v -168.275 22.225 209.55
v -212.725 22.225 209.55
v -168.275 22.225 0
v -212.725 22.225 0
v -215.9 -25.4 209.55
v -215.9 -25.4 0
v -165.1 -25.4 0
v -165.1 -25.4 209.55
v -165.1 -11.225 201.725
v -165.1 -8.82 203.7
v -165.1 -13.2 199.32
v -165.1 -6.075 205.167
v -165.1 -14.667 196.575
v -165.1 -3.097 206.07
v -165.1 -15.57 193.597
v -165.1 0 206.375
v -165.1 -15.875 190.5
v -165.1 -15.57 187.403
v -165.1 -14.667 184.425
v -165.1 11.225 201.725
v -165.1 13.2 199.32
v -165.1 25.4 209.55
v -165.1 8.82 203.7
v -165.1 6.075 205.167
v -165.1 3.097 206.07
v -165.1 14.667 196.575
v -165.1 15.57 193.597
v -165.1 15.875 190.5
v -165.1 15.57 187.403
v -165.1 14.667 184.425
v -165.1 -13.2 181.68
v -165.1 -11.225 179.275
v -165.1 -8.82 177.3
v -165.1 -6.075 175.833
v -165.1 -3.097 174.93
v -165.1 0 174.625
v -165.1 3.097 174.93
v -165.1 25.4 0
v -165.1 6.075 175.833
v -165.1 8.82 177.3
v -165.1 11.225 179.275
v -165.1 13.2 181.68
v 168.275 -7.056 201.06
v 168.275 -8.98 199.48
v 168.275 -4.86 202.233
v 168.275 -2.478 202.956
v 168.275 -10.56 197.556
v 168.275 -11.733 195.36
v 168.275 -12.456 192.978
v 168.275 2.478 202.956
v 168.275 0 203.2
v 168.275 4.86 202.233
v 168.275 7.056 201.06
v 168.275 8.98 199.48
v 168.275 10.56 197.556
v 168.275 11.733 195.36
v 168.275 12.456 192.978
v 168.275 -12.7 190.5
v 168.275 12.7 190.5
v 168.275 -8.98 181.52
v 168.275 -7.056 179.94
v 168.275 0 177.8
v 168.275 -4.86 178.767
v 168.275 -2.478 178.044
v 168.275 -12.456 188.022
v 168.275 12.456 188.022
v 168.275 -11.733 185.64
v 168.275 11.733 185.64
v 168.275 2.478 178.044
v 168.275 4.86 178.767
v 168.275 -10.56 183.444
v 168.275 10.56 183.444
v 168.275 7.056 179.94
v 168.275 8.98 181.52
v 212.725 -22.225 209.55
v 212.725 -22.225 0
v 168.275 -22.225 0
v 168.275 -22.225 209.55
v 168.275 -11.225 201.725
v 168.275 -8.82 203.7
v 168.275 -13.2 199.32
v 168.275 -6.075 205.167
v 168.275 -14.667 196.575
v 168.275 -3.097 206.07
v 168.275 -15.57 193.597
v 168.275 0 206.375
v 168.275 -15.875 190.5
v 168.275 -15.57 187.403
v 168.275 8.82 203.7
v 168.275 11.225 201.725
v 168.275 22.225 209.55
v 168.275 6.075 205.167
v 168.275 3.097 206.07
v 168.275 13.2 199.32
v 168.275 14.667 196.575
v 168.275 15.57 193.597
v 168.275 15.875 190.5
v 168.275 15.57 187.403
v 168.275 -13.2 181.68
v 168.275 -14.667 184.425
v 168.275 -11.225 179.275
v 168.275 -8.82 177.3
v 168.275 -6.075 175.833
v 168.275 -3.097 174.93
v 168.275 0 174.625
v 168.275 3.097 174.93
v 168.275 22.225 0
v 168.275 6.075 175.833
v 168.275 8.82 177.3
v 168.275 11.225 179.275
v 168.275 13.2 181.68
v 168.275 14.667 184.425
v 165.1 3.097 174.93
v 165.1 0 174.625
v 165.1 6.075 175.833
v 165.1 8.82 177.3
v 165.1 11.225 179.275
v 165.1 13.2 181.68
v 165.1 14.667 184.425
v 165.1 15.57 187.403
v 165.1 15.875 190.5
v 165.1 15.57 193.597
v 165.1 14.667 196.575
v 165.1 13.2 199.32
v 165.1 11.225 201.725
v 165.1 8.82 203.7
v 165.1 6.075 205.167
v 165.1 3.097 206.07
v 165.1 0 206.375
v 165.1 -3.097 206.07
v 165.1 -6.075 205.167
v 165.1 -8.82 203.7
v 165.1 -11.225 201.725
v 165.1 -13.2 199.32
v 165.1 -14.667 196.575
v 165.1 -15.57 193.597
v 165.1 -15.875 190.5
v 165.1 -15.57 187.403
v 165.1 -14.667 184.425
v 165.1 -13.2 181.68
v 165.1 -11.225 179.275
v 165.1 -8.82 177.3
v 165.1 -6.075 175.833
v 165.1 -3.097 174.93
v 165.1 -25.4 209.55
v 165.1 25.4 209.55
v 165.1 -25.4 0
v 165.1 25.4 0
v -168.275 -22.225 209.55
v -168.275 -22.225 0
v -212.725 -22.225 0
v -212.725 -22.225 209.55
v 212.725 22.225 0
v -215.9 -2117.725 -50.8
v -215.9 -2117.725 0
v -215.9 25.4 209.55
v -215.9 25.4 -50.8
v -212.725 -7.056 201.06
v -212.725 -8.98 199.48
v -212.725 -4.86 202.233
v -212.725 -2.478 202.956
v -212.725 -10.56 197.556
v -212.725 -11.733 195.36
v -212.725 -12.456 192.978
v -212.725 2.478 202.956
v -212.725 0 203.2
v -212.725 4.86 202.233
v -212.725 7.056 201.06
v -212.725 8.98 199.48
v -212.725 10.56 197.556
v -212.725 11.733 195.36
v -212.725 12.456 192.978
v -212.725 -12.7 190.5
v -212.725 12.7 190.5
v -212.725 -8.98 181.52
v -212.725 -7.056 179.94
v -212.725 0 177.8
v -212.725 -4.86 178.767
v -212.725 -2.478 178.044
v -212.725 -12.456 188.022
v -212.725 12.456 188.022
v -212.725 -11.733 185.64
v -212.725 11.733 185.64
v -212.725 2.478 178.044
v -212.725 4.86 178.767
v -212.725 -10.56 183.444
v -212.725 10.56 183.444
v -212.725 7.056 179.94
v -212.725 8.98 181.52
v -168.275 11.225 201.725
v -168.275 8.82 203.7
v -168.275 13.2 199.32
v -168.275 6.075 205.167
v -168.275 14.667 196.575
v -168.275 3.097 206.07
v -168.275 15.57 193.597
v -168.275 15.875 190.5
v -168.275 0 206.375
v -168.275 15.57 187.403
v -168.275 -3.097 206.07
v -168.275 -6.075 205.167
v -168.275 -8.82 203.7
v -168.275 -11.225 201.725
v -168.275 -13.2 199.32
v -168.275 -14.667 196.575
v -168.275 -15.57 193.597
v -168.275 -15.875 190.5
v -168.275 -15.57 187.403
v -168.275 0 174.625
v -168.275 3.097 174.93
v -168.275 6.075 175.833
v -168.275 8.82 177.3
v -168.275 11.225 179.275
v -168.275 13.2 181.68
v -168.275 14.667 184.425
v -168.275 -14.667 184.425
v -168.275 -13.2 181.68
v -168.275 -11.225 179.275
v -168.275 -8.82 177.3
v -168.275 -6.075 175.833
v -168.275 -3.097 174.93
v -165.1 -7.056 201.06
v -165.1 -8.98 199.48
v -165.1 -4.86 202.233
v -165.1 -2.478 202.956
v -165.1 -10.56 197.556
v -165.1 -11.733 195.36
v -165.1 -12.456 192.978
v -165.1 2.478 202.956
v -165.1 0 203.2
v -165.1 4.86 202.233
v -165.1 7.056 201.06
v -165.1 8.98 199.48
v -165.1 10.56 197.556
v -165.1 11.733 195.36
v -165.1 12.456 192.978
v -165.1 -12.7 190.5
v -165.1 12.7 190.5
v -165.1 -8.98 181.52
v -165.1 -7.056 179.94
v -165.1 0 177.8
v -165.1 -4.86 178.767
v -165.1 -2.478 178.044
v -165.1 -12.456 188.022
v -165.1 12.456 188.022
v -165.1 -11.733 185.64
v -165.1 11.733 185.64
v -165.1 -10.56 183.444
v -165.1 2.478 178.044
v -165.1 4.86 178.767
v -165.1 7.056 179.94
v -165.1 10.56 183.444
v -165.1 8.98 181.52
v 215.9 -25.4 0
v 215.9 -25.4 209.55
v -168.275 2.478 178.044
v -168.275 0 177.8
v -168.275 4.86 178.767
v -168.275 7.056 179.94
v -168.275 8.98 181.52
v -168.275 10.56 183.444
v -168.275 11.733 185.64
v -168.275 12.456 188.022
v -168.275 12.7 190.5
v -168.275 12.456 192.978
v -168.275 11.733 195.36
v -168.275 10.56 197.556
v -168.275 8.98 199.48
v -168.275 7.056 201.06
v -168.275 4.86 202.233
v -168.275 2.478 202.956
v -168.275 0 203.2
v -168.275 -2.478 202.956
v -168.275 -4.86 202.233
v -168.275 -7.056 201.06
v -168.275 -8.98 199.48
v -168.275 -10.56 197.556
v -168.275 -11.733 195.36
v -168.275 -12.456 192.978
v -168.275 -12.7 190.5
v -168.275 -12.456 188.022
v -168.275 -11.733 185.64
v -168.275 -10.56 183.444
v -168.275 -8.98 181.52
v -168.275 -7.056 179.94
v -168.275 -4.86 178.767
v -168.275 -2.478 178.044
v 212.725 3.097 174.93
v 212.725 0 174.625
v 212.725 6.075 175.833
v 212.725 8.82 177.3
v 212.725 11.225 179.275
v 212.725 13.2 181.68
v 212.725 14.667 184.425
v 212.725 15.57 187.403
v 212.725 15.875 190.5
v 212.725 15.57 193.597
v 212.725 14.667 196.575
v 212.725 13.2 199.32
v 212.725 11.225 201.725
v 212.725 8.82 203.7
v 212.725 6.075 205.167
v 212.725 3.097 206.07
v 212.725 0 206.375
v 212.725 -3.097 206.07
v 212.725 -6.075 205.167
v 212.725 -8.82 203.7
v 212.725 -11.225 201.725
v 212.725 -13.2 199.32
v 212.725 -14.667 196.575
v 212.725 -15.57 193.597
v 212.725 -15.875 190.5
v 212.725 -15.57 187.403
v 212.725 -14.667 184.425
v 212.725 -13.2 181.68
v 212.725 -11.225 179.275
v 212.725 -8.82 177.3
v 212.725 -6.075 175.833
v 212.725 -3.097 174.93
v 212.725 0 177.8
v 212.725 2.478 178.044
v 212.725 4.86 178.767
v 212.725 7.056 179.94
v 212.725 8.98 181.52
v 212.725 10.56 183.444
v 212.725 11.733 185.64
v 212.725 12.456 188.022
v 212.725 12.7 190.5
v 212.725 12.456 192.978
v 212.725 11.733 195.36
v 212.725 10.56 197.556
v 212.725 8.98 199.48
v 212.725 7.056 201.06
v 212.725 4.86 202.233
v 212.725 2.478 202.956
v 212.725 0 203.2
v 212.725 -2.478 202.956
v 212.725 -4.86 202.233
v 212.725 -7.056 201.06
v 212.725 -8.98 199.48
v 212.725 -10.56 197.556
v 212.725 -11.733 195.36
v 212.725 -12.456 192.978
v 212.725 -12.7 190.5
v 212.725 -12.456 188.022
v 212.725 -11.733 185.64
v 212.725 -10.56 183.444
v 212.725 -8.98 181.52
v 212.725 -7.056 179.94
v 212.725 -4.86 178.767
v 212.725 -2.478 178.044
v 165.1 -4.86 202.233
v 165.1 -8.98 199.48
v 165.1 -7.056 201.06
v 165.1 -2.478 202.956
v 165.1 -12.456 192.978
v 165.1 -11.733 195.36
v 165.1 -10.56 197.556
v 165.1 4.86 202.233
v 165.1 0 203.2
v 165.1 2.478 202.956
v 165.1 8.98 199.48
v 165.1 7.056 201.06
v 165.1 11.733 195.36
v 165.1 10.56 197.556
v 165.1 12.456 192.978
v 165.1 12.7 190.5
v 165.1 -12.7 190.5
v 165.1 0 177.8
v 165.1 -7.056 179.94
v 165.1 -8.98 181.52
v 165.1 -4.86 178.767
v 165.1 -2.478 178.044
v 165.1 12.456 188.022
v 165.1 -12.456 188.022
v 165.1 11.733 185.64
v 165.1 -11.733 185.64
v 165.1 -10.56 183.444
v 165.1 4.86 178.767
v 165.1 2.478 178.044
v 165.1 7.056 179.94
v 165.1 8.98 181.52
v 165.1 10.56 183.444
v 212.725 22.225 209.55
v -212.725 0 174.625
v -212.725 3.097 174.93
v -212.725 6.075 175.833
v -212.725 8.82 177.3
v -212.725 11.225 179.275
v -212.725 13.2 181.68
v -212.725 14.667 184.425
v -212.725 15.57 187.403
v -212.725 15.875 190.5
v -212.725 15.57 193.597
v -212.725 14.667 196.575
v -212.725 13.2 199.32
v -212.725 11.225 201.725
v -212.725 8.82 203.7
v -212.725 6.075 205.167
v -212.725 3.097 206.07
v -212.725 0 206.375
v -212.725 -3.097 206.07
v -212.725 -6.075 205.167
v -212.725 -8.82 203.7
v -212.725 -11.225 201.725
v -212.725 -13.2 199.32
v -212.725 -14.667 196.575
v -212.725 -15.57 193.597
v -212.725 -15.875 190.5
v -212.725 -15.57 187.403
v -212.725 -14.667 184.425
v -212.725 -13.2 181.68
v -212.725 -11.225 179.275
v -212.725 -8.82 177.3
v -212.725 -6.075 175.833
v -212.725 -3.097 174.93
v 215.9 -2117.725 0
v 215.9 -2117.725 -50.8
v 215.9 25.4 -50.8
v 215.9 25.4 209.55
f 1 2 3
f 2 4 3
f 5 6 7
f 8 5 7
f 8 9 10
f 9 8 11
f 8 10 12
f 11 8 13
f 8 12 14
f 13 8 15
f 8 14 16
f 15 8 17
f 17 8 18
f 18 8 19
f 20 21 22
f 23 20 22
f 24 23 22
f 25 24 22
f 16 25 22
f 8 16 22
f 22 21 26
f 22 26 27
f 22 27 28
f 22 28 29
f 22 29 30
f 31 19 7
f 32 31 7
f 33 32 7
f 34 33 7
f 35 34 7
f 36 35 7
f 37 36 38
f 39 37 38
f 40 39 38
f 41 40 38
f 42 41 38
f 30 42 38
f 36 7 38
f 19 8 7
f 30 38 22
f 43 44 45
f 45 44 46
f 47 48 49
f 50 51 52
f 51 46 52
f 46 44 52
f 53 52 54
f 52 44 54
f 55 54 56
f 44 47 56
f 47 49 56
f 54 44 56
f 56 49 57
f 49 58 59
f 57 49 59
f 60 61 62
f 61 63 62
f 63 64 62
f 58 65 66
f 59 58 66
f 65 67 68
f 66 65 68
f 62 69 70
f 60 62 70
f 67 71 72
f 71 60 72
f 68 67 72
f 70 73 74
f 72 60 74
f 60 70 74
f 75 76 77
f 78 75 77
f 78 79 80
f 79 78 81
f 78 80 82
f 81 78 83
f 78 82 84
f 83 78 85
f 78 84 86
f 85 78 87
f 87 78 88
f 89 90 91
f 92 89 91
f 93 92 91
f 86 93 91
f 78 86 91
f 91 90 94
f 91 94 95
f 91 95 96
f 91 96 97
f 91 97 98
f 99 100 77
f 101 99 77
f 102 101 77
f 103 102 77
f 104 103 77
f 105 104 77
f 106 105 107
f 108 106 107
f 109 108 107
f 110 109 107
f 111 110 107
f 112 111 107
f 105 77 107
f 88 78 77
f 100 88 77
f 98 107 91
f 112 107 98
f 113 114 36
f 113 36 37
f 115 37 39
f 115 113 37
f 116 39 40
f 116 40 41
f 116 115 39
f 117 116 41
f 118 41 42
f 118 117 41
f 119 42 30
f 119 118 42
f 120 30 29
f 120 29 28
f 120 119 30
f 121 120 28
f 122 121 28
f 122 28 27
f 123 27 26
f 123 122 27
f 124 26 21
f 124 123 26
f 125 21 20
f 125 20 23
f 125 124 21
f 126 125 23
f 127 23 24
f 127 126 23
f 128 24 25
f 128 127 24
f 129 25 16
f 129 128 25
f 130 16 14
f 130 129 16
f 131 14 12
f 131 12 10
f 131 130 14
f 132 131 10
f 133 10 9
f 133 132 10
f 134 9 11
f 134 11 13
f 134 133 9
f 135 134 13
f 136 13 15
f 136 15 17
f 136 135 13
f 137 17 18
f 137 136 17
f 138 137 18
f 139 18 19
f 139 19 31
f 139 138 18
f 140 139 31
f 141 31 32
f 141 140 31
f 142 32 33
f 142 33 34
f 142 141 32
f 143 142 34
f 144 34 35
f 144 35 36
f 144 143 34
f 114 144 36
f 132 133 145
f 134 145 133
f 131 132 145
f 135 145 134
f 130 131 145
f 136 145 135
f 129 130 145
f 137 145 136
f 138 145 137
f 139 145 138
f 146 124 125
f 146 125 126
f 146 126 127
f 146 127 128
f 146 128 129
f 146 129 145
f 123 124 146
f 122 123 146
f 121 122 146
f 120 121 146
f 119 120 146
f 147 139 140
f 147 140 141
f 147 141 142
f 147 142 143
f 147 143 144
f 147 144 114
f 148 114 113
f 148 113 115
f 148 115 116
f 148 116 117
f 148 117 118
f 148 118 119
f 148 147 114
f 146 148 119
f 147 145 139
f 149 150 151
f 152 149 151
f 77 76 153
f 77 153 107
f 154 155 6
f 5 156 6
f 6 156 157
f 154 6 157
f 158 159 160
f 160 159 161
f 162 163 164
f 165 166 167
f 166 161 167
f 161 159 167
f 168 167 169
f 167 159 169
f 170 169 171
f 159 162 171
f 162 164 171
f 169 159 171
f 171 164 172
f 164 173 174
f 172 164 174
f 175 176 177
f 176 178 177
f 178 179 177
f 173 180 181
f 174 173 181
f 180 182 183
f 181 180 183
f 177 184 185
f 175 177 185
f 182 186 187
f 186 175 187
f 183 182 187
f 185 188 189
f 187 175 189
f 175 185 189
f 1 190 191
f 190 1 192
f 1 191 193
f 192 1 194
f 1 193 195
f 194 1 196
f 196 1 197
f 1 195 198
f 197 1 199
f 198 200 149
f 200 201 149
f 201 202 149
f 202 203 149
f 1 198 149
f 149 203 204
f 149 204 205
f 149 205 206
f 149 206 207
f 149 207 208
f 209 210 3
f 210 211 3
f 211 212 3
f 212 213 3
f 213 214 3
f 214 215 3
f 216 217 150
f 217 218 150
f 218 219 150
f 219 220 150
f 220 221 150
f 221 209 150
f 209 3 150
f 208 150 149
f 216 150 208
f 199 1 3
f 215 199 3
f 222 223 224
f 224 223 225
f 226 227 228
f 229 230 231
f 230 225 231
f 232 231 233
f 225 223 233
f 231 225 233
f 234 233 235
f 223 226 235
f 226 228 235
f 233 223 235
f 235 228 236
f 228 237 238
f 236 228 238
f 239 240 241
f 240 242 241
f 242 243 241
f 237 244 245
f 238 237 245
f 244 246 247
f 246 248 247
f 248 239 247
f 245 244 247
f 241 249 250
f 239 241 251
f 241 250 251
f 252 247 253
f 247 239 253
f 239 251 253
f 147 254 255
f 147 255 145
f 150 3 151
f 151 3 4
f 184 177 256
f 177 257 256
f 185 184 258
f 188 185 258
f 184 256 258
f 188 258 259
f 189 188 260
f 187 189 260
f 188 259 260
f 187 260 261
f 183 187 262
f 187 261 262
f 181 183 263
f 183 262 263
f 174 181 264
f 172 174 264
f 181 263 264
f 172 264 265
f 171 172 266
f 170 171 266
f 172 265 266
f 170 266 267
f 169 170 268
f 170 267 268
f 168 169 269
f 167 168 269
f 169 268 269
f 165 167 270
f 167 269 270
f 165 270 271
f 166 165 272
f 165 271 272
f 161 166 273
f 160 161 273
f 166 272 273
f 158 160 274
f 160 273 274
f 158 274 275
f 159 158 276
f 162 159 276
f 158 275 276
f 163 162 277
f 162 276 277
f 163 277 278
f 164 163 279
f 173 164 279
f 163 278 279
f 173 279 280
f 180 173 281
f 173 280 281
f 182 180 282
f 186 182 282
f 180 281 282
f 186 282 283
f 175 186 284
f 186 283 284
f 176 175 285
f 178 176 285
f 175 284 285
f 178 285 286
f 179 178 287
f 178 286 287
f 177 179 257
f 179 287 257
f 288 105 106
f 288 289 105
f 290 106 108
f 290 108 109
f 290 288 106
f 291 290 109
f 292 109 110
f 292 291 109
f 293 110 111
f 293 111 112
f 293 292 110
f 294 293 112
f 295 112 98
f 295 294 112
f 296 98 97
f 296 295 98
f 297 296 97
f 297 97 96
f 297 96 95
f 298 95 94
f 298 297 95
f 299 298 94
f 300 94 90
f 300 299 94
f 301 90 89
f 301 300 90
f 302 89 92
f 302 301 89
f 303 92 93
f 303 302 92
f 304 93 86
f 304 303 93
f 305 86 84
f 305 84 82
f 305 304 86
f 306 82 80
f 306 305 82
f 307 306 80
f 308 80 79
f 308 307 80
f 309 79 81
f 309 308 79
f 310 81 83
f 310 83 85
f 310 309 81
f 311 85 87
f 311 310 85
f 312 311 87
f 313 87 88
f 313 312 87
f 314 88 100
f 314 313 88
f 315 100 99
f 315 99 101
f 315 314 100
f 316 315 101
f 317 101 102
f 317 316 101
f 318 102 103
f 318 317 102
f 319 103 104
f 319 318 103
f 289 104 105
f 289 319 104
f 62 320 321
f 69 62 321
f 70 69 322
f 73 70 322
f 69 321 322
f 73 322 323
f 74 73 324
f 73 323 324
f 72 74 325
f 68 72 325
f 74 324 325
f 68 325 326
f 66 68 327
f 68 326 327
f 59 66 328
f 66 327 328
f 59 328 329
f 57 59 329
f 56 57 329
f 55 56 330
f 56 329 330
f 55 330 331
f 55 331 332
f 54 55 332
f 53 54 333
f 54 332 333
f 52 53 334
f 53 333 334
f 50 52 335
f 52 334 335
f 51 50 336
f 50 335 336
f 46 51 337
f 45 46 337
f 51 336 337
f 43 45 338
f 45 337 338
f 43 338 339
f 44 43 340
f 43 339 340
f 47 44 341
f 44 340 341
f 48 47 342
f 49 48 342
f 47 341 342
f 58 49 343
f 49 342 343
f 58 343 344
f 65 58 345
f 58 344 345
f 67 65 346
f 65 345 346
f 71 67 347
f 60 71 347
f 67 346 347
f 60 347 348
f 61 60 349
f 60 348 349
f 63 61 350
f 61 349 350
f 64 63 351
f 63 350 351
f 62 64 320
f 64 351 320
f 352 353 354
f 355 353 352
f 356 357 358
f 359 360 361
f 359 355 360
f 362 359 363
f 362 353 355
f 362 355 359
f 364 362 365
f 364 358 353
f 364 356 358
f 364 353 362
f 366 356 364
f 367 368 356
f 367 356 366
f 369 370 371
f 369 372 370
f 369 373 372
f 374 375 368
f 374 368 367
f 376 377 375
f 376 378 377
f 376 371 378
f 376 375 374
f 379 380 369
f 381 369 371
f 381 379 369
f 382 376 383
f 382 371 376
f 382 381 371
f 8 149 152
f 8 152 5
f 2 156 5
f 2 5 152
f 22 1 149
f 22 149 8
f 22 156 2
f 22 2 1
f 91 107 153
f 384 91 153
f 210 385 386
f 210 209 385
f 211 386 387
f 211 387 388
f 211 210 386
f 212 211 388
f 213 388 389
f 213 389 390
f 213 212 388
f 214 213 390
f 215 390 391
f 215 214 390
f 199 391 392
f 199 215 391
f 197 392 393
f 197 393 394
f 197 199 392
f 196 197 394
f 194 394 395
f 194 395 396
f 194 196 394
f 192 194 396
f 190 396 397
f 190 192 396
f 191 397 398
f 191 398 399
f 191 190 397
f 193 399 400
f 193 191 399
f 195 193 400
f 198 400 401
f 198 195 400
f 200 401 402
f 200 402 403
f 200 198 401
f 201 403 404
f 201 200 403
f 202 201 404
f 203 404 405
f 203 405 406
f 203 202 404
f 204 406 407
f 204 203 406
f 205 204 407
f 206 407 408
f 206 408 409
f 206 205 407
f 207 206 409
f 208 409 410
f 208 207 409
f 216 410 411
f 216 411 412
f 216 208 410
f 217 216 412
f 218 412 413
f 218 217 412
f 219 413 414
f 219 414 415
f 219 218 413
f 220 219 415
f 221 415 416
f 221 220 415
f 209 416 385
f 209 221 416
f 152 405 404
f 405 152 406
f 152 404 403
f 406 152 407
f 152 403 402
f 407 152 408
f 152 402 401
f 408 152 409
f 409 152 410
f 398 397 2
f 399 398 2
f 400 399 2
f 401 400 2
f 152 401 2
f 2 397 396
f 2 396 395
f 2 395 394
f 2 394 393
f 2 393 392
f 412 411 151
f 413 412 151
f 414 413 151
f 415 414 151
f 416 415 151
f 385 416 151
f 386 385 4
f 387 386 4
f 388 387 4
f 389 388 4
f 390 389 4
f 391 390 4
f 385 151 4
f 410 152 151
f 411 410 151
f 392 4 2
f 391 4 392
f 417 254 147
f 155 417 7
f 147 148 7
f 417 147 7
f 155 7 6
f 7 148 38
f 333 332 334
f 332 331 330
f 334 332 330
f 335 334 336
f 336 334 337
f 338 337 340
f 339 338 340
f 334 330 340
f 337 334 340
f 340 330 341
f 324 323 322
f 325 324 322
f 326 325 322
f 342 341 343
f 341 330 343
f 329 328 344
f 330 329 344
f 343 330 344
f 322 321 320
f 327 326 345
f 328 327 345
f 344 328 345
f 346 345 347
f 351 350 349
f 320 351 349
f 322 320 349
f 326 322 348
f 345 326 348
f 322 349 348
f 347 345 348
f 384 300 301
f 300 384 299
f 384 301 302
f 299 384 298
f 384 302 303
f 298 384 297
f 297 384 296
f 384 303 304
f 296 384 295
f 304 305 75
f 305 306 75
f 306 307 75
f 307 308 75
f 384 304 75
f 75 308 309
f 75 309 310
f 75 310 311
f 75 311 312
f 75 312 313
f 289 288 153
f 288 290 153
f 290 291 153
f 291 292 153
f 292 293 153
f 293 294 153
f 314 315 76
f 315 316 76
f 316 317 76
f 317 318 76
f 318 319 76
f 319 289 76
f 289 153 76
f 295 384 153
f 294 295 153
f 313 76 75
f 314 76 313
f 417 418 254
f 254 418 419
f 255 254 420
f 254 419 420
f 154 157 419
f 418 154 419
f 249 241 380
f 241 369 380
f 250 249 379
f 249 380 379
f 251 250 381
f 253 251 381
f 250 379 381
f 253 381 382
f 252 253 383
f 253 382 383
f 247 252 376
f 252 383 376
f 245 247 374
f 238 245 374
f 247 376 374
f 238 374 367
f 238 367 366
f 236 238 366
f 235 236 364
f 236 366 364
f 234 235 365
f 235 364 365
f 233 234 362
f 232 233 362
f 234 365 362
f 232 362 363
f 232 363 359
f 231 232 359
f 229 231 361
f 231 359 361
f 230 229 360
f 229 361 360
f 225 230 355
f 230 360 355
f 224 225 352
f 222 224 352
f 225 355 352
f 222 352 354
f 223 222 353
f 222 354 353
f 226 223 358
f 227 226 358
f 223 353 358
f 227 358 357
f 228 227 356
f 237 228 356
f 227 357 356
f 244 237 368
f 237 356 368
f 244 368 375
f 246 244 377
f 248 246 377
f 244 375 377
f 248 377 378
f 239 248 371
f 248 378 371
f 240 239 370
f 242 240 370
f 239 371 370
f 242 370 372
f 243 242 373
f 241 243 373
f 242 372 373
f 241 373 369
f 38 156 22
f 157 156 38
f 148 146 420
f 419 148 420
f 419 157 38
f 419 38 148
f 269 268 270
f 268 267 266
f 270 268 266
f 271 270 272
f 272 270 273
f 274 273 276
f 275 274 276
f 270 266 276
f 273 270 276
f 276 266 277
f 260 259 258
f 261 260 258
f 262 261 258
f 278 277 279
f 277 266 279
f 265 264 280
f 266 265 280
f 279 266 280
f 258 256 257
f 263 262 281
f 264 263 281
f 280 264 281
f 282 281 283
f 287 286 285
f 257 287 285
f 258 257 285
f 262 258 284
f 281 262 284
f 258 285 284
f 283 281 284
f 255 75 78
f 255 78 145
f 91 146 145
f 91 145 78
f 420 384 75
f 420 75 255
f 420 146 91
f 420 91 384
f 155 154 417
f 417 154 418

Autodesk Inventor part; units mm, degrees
ref_plane "YZ Plane" through (0, 0, 0) normal (1, 0, 0) x (0, 1, 0)
ref_plane "XZ Plane" through (0, 0, 0) normal (0, 1, 0) x (-1, 0, 0)
ref_plane "XY Plane" through (0, 0, 0) normal (0, 0, 1) x (1, 0, 0)
sketch "Sketch1" plane through (0, 0, 0) normal (0, 0, 1) x (1, 0, 0)
  line L0 (-165.1, 0) -> (165.1, 0) construction
  line L1 (-215.9, -25.4) -> (-165.1, -25.4)
  line L2 (-165.1, -25.4) -> (-165.1, 25.4)
  line L3 (-165.1, 25.4) -> (-215.9, 25.4)
  line L4 (-215.9, 25.4) -> (-215.9, -25.4)
  line L5 (-215.9, -25.4) -> (-165.1, 25.4) construction
  line L6 (-165.1, -25.4) -> (-215.9, 25.4) construction
  line L7 (215.9, -25.4) -> (165.1, -25.4)
  line L8 (165.1, -25.4) -> (165.1, 25.4)
  line L9 (165.1, 25.4) -> (215.9, 25.4)
  line L10 (215.9, 25.4) -> (215.9, -25.4)
  line L11 (215.9, -25.4) -> (165.1, 25.4) construction
  line L12 (165.1, -25.4) -> (215.9, 25.4) construction
  line L13 (-168.275, 22.225) -> (-168.275, -22.225)
  line L14 (-168.275, -22.225) -> (-212.725, -22.225)
  line L15 (-212.725, -22.225) -> (-212.725, 22.225)
  line L16 (-212.725, 22.225) -> (-168.275, 22.225)
  line L17 (212.725, -22.225) -> (168.275, -22.225)
  line L18 (168.275, -22.225) -> (168.275, 22.225)
  line L19 (168.275, 22.225) -> (212.725, 22.225)
  line L20 (212.725, 22.225) -> (212.725, -22.225)
  point P0 (0, 0)
  point P1 (0, 0)
  point P2 (-190.5, 0)
  point P3 (190.5, 0)
  dimension "d0" = 330.2
  dimension "d1" = 50.8
  dimension "d2" = 3.175
  dimension "d3" = 3.175
extrude "Extrusion1" add sketch "Sketch1" along normal blind 209.55
sketch "Sketch2" plane through (215.9, -25.4, 0) normal (1, 0, 0) x (0, 0, -1)
  line L0 (0, 25.4) -> (-209.55, 25.4) construction
  line L1 (-209.55, 3.175) -> (-209.55, 47.625) construction
  circle A0 centre (-190.5, 25.4) radius 15.875
  circle A1 centre (-190.5, 25.4) radius 12.7
  dimension "d6" = 31.75
  dimension "d7" = 19.05
  dimension "d8" = 3.175
extrude "Extrusion2" add sketch "Sketch2" against normal up to surface (431.8 mm away)
sketch "Sketch3" plane through (-215.9, 25.4, 0) normal (0, 1, 0) x (1, 0, 0)
  line L0 (431.8, 0) -> (0, 0)
  line L1 (0, 0) -> (0, 50.8)
  line L2 (0, 50.8) -> (431.8, 50.8)
  line L3 (431.8, 50.8) -> (431.8, 0)
  point P0 (215.9, 0)
  point P1 (215.9, 0)
  dimension "d11" = 431.8
  dimension "d12" = 50.8
extrude "Extrusion3" add sketch "Sketch3" against normal blind 2143.125
properties part number "rung" material "Aluminum 6061"
